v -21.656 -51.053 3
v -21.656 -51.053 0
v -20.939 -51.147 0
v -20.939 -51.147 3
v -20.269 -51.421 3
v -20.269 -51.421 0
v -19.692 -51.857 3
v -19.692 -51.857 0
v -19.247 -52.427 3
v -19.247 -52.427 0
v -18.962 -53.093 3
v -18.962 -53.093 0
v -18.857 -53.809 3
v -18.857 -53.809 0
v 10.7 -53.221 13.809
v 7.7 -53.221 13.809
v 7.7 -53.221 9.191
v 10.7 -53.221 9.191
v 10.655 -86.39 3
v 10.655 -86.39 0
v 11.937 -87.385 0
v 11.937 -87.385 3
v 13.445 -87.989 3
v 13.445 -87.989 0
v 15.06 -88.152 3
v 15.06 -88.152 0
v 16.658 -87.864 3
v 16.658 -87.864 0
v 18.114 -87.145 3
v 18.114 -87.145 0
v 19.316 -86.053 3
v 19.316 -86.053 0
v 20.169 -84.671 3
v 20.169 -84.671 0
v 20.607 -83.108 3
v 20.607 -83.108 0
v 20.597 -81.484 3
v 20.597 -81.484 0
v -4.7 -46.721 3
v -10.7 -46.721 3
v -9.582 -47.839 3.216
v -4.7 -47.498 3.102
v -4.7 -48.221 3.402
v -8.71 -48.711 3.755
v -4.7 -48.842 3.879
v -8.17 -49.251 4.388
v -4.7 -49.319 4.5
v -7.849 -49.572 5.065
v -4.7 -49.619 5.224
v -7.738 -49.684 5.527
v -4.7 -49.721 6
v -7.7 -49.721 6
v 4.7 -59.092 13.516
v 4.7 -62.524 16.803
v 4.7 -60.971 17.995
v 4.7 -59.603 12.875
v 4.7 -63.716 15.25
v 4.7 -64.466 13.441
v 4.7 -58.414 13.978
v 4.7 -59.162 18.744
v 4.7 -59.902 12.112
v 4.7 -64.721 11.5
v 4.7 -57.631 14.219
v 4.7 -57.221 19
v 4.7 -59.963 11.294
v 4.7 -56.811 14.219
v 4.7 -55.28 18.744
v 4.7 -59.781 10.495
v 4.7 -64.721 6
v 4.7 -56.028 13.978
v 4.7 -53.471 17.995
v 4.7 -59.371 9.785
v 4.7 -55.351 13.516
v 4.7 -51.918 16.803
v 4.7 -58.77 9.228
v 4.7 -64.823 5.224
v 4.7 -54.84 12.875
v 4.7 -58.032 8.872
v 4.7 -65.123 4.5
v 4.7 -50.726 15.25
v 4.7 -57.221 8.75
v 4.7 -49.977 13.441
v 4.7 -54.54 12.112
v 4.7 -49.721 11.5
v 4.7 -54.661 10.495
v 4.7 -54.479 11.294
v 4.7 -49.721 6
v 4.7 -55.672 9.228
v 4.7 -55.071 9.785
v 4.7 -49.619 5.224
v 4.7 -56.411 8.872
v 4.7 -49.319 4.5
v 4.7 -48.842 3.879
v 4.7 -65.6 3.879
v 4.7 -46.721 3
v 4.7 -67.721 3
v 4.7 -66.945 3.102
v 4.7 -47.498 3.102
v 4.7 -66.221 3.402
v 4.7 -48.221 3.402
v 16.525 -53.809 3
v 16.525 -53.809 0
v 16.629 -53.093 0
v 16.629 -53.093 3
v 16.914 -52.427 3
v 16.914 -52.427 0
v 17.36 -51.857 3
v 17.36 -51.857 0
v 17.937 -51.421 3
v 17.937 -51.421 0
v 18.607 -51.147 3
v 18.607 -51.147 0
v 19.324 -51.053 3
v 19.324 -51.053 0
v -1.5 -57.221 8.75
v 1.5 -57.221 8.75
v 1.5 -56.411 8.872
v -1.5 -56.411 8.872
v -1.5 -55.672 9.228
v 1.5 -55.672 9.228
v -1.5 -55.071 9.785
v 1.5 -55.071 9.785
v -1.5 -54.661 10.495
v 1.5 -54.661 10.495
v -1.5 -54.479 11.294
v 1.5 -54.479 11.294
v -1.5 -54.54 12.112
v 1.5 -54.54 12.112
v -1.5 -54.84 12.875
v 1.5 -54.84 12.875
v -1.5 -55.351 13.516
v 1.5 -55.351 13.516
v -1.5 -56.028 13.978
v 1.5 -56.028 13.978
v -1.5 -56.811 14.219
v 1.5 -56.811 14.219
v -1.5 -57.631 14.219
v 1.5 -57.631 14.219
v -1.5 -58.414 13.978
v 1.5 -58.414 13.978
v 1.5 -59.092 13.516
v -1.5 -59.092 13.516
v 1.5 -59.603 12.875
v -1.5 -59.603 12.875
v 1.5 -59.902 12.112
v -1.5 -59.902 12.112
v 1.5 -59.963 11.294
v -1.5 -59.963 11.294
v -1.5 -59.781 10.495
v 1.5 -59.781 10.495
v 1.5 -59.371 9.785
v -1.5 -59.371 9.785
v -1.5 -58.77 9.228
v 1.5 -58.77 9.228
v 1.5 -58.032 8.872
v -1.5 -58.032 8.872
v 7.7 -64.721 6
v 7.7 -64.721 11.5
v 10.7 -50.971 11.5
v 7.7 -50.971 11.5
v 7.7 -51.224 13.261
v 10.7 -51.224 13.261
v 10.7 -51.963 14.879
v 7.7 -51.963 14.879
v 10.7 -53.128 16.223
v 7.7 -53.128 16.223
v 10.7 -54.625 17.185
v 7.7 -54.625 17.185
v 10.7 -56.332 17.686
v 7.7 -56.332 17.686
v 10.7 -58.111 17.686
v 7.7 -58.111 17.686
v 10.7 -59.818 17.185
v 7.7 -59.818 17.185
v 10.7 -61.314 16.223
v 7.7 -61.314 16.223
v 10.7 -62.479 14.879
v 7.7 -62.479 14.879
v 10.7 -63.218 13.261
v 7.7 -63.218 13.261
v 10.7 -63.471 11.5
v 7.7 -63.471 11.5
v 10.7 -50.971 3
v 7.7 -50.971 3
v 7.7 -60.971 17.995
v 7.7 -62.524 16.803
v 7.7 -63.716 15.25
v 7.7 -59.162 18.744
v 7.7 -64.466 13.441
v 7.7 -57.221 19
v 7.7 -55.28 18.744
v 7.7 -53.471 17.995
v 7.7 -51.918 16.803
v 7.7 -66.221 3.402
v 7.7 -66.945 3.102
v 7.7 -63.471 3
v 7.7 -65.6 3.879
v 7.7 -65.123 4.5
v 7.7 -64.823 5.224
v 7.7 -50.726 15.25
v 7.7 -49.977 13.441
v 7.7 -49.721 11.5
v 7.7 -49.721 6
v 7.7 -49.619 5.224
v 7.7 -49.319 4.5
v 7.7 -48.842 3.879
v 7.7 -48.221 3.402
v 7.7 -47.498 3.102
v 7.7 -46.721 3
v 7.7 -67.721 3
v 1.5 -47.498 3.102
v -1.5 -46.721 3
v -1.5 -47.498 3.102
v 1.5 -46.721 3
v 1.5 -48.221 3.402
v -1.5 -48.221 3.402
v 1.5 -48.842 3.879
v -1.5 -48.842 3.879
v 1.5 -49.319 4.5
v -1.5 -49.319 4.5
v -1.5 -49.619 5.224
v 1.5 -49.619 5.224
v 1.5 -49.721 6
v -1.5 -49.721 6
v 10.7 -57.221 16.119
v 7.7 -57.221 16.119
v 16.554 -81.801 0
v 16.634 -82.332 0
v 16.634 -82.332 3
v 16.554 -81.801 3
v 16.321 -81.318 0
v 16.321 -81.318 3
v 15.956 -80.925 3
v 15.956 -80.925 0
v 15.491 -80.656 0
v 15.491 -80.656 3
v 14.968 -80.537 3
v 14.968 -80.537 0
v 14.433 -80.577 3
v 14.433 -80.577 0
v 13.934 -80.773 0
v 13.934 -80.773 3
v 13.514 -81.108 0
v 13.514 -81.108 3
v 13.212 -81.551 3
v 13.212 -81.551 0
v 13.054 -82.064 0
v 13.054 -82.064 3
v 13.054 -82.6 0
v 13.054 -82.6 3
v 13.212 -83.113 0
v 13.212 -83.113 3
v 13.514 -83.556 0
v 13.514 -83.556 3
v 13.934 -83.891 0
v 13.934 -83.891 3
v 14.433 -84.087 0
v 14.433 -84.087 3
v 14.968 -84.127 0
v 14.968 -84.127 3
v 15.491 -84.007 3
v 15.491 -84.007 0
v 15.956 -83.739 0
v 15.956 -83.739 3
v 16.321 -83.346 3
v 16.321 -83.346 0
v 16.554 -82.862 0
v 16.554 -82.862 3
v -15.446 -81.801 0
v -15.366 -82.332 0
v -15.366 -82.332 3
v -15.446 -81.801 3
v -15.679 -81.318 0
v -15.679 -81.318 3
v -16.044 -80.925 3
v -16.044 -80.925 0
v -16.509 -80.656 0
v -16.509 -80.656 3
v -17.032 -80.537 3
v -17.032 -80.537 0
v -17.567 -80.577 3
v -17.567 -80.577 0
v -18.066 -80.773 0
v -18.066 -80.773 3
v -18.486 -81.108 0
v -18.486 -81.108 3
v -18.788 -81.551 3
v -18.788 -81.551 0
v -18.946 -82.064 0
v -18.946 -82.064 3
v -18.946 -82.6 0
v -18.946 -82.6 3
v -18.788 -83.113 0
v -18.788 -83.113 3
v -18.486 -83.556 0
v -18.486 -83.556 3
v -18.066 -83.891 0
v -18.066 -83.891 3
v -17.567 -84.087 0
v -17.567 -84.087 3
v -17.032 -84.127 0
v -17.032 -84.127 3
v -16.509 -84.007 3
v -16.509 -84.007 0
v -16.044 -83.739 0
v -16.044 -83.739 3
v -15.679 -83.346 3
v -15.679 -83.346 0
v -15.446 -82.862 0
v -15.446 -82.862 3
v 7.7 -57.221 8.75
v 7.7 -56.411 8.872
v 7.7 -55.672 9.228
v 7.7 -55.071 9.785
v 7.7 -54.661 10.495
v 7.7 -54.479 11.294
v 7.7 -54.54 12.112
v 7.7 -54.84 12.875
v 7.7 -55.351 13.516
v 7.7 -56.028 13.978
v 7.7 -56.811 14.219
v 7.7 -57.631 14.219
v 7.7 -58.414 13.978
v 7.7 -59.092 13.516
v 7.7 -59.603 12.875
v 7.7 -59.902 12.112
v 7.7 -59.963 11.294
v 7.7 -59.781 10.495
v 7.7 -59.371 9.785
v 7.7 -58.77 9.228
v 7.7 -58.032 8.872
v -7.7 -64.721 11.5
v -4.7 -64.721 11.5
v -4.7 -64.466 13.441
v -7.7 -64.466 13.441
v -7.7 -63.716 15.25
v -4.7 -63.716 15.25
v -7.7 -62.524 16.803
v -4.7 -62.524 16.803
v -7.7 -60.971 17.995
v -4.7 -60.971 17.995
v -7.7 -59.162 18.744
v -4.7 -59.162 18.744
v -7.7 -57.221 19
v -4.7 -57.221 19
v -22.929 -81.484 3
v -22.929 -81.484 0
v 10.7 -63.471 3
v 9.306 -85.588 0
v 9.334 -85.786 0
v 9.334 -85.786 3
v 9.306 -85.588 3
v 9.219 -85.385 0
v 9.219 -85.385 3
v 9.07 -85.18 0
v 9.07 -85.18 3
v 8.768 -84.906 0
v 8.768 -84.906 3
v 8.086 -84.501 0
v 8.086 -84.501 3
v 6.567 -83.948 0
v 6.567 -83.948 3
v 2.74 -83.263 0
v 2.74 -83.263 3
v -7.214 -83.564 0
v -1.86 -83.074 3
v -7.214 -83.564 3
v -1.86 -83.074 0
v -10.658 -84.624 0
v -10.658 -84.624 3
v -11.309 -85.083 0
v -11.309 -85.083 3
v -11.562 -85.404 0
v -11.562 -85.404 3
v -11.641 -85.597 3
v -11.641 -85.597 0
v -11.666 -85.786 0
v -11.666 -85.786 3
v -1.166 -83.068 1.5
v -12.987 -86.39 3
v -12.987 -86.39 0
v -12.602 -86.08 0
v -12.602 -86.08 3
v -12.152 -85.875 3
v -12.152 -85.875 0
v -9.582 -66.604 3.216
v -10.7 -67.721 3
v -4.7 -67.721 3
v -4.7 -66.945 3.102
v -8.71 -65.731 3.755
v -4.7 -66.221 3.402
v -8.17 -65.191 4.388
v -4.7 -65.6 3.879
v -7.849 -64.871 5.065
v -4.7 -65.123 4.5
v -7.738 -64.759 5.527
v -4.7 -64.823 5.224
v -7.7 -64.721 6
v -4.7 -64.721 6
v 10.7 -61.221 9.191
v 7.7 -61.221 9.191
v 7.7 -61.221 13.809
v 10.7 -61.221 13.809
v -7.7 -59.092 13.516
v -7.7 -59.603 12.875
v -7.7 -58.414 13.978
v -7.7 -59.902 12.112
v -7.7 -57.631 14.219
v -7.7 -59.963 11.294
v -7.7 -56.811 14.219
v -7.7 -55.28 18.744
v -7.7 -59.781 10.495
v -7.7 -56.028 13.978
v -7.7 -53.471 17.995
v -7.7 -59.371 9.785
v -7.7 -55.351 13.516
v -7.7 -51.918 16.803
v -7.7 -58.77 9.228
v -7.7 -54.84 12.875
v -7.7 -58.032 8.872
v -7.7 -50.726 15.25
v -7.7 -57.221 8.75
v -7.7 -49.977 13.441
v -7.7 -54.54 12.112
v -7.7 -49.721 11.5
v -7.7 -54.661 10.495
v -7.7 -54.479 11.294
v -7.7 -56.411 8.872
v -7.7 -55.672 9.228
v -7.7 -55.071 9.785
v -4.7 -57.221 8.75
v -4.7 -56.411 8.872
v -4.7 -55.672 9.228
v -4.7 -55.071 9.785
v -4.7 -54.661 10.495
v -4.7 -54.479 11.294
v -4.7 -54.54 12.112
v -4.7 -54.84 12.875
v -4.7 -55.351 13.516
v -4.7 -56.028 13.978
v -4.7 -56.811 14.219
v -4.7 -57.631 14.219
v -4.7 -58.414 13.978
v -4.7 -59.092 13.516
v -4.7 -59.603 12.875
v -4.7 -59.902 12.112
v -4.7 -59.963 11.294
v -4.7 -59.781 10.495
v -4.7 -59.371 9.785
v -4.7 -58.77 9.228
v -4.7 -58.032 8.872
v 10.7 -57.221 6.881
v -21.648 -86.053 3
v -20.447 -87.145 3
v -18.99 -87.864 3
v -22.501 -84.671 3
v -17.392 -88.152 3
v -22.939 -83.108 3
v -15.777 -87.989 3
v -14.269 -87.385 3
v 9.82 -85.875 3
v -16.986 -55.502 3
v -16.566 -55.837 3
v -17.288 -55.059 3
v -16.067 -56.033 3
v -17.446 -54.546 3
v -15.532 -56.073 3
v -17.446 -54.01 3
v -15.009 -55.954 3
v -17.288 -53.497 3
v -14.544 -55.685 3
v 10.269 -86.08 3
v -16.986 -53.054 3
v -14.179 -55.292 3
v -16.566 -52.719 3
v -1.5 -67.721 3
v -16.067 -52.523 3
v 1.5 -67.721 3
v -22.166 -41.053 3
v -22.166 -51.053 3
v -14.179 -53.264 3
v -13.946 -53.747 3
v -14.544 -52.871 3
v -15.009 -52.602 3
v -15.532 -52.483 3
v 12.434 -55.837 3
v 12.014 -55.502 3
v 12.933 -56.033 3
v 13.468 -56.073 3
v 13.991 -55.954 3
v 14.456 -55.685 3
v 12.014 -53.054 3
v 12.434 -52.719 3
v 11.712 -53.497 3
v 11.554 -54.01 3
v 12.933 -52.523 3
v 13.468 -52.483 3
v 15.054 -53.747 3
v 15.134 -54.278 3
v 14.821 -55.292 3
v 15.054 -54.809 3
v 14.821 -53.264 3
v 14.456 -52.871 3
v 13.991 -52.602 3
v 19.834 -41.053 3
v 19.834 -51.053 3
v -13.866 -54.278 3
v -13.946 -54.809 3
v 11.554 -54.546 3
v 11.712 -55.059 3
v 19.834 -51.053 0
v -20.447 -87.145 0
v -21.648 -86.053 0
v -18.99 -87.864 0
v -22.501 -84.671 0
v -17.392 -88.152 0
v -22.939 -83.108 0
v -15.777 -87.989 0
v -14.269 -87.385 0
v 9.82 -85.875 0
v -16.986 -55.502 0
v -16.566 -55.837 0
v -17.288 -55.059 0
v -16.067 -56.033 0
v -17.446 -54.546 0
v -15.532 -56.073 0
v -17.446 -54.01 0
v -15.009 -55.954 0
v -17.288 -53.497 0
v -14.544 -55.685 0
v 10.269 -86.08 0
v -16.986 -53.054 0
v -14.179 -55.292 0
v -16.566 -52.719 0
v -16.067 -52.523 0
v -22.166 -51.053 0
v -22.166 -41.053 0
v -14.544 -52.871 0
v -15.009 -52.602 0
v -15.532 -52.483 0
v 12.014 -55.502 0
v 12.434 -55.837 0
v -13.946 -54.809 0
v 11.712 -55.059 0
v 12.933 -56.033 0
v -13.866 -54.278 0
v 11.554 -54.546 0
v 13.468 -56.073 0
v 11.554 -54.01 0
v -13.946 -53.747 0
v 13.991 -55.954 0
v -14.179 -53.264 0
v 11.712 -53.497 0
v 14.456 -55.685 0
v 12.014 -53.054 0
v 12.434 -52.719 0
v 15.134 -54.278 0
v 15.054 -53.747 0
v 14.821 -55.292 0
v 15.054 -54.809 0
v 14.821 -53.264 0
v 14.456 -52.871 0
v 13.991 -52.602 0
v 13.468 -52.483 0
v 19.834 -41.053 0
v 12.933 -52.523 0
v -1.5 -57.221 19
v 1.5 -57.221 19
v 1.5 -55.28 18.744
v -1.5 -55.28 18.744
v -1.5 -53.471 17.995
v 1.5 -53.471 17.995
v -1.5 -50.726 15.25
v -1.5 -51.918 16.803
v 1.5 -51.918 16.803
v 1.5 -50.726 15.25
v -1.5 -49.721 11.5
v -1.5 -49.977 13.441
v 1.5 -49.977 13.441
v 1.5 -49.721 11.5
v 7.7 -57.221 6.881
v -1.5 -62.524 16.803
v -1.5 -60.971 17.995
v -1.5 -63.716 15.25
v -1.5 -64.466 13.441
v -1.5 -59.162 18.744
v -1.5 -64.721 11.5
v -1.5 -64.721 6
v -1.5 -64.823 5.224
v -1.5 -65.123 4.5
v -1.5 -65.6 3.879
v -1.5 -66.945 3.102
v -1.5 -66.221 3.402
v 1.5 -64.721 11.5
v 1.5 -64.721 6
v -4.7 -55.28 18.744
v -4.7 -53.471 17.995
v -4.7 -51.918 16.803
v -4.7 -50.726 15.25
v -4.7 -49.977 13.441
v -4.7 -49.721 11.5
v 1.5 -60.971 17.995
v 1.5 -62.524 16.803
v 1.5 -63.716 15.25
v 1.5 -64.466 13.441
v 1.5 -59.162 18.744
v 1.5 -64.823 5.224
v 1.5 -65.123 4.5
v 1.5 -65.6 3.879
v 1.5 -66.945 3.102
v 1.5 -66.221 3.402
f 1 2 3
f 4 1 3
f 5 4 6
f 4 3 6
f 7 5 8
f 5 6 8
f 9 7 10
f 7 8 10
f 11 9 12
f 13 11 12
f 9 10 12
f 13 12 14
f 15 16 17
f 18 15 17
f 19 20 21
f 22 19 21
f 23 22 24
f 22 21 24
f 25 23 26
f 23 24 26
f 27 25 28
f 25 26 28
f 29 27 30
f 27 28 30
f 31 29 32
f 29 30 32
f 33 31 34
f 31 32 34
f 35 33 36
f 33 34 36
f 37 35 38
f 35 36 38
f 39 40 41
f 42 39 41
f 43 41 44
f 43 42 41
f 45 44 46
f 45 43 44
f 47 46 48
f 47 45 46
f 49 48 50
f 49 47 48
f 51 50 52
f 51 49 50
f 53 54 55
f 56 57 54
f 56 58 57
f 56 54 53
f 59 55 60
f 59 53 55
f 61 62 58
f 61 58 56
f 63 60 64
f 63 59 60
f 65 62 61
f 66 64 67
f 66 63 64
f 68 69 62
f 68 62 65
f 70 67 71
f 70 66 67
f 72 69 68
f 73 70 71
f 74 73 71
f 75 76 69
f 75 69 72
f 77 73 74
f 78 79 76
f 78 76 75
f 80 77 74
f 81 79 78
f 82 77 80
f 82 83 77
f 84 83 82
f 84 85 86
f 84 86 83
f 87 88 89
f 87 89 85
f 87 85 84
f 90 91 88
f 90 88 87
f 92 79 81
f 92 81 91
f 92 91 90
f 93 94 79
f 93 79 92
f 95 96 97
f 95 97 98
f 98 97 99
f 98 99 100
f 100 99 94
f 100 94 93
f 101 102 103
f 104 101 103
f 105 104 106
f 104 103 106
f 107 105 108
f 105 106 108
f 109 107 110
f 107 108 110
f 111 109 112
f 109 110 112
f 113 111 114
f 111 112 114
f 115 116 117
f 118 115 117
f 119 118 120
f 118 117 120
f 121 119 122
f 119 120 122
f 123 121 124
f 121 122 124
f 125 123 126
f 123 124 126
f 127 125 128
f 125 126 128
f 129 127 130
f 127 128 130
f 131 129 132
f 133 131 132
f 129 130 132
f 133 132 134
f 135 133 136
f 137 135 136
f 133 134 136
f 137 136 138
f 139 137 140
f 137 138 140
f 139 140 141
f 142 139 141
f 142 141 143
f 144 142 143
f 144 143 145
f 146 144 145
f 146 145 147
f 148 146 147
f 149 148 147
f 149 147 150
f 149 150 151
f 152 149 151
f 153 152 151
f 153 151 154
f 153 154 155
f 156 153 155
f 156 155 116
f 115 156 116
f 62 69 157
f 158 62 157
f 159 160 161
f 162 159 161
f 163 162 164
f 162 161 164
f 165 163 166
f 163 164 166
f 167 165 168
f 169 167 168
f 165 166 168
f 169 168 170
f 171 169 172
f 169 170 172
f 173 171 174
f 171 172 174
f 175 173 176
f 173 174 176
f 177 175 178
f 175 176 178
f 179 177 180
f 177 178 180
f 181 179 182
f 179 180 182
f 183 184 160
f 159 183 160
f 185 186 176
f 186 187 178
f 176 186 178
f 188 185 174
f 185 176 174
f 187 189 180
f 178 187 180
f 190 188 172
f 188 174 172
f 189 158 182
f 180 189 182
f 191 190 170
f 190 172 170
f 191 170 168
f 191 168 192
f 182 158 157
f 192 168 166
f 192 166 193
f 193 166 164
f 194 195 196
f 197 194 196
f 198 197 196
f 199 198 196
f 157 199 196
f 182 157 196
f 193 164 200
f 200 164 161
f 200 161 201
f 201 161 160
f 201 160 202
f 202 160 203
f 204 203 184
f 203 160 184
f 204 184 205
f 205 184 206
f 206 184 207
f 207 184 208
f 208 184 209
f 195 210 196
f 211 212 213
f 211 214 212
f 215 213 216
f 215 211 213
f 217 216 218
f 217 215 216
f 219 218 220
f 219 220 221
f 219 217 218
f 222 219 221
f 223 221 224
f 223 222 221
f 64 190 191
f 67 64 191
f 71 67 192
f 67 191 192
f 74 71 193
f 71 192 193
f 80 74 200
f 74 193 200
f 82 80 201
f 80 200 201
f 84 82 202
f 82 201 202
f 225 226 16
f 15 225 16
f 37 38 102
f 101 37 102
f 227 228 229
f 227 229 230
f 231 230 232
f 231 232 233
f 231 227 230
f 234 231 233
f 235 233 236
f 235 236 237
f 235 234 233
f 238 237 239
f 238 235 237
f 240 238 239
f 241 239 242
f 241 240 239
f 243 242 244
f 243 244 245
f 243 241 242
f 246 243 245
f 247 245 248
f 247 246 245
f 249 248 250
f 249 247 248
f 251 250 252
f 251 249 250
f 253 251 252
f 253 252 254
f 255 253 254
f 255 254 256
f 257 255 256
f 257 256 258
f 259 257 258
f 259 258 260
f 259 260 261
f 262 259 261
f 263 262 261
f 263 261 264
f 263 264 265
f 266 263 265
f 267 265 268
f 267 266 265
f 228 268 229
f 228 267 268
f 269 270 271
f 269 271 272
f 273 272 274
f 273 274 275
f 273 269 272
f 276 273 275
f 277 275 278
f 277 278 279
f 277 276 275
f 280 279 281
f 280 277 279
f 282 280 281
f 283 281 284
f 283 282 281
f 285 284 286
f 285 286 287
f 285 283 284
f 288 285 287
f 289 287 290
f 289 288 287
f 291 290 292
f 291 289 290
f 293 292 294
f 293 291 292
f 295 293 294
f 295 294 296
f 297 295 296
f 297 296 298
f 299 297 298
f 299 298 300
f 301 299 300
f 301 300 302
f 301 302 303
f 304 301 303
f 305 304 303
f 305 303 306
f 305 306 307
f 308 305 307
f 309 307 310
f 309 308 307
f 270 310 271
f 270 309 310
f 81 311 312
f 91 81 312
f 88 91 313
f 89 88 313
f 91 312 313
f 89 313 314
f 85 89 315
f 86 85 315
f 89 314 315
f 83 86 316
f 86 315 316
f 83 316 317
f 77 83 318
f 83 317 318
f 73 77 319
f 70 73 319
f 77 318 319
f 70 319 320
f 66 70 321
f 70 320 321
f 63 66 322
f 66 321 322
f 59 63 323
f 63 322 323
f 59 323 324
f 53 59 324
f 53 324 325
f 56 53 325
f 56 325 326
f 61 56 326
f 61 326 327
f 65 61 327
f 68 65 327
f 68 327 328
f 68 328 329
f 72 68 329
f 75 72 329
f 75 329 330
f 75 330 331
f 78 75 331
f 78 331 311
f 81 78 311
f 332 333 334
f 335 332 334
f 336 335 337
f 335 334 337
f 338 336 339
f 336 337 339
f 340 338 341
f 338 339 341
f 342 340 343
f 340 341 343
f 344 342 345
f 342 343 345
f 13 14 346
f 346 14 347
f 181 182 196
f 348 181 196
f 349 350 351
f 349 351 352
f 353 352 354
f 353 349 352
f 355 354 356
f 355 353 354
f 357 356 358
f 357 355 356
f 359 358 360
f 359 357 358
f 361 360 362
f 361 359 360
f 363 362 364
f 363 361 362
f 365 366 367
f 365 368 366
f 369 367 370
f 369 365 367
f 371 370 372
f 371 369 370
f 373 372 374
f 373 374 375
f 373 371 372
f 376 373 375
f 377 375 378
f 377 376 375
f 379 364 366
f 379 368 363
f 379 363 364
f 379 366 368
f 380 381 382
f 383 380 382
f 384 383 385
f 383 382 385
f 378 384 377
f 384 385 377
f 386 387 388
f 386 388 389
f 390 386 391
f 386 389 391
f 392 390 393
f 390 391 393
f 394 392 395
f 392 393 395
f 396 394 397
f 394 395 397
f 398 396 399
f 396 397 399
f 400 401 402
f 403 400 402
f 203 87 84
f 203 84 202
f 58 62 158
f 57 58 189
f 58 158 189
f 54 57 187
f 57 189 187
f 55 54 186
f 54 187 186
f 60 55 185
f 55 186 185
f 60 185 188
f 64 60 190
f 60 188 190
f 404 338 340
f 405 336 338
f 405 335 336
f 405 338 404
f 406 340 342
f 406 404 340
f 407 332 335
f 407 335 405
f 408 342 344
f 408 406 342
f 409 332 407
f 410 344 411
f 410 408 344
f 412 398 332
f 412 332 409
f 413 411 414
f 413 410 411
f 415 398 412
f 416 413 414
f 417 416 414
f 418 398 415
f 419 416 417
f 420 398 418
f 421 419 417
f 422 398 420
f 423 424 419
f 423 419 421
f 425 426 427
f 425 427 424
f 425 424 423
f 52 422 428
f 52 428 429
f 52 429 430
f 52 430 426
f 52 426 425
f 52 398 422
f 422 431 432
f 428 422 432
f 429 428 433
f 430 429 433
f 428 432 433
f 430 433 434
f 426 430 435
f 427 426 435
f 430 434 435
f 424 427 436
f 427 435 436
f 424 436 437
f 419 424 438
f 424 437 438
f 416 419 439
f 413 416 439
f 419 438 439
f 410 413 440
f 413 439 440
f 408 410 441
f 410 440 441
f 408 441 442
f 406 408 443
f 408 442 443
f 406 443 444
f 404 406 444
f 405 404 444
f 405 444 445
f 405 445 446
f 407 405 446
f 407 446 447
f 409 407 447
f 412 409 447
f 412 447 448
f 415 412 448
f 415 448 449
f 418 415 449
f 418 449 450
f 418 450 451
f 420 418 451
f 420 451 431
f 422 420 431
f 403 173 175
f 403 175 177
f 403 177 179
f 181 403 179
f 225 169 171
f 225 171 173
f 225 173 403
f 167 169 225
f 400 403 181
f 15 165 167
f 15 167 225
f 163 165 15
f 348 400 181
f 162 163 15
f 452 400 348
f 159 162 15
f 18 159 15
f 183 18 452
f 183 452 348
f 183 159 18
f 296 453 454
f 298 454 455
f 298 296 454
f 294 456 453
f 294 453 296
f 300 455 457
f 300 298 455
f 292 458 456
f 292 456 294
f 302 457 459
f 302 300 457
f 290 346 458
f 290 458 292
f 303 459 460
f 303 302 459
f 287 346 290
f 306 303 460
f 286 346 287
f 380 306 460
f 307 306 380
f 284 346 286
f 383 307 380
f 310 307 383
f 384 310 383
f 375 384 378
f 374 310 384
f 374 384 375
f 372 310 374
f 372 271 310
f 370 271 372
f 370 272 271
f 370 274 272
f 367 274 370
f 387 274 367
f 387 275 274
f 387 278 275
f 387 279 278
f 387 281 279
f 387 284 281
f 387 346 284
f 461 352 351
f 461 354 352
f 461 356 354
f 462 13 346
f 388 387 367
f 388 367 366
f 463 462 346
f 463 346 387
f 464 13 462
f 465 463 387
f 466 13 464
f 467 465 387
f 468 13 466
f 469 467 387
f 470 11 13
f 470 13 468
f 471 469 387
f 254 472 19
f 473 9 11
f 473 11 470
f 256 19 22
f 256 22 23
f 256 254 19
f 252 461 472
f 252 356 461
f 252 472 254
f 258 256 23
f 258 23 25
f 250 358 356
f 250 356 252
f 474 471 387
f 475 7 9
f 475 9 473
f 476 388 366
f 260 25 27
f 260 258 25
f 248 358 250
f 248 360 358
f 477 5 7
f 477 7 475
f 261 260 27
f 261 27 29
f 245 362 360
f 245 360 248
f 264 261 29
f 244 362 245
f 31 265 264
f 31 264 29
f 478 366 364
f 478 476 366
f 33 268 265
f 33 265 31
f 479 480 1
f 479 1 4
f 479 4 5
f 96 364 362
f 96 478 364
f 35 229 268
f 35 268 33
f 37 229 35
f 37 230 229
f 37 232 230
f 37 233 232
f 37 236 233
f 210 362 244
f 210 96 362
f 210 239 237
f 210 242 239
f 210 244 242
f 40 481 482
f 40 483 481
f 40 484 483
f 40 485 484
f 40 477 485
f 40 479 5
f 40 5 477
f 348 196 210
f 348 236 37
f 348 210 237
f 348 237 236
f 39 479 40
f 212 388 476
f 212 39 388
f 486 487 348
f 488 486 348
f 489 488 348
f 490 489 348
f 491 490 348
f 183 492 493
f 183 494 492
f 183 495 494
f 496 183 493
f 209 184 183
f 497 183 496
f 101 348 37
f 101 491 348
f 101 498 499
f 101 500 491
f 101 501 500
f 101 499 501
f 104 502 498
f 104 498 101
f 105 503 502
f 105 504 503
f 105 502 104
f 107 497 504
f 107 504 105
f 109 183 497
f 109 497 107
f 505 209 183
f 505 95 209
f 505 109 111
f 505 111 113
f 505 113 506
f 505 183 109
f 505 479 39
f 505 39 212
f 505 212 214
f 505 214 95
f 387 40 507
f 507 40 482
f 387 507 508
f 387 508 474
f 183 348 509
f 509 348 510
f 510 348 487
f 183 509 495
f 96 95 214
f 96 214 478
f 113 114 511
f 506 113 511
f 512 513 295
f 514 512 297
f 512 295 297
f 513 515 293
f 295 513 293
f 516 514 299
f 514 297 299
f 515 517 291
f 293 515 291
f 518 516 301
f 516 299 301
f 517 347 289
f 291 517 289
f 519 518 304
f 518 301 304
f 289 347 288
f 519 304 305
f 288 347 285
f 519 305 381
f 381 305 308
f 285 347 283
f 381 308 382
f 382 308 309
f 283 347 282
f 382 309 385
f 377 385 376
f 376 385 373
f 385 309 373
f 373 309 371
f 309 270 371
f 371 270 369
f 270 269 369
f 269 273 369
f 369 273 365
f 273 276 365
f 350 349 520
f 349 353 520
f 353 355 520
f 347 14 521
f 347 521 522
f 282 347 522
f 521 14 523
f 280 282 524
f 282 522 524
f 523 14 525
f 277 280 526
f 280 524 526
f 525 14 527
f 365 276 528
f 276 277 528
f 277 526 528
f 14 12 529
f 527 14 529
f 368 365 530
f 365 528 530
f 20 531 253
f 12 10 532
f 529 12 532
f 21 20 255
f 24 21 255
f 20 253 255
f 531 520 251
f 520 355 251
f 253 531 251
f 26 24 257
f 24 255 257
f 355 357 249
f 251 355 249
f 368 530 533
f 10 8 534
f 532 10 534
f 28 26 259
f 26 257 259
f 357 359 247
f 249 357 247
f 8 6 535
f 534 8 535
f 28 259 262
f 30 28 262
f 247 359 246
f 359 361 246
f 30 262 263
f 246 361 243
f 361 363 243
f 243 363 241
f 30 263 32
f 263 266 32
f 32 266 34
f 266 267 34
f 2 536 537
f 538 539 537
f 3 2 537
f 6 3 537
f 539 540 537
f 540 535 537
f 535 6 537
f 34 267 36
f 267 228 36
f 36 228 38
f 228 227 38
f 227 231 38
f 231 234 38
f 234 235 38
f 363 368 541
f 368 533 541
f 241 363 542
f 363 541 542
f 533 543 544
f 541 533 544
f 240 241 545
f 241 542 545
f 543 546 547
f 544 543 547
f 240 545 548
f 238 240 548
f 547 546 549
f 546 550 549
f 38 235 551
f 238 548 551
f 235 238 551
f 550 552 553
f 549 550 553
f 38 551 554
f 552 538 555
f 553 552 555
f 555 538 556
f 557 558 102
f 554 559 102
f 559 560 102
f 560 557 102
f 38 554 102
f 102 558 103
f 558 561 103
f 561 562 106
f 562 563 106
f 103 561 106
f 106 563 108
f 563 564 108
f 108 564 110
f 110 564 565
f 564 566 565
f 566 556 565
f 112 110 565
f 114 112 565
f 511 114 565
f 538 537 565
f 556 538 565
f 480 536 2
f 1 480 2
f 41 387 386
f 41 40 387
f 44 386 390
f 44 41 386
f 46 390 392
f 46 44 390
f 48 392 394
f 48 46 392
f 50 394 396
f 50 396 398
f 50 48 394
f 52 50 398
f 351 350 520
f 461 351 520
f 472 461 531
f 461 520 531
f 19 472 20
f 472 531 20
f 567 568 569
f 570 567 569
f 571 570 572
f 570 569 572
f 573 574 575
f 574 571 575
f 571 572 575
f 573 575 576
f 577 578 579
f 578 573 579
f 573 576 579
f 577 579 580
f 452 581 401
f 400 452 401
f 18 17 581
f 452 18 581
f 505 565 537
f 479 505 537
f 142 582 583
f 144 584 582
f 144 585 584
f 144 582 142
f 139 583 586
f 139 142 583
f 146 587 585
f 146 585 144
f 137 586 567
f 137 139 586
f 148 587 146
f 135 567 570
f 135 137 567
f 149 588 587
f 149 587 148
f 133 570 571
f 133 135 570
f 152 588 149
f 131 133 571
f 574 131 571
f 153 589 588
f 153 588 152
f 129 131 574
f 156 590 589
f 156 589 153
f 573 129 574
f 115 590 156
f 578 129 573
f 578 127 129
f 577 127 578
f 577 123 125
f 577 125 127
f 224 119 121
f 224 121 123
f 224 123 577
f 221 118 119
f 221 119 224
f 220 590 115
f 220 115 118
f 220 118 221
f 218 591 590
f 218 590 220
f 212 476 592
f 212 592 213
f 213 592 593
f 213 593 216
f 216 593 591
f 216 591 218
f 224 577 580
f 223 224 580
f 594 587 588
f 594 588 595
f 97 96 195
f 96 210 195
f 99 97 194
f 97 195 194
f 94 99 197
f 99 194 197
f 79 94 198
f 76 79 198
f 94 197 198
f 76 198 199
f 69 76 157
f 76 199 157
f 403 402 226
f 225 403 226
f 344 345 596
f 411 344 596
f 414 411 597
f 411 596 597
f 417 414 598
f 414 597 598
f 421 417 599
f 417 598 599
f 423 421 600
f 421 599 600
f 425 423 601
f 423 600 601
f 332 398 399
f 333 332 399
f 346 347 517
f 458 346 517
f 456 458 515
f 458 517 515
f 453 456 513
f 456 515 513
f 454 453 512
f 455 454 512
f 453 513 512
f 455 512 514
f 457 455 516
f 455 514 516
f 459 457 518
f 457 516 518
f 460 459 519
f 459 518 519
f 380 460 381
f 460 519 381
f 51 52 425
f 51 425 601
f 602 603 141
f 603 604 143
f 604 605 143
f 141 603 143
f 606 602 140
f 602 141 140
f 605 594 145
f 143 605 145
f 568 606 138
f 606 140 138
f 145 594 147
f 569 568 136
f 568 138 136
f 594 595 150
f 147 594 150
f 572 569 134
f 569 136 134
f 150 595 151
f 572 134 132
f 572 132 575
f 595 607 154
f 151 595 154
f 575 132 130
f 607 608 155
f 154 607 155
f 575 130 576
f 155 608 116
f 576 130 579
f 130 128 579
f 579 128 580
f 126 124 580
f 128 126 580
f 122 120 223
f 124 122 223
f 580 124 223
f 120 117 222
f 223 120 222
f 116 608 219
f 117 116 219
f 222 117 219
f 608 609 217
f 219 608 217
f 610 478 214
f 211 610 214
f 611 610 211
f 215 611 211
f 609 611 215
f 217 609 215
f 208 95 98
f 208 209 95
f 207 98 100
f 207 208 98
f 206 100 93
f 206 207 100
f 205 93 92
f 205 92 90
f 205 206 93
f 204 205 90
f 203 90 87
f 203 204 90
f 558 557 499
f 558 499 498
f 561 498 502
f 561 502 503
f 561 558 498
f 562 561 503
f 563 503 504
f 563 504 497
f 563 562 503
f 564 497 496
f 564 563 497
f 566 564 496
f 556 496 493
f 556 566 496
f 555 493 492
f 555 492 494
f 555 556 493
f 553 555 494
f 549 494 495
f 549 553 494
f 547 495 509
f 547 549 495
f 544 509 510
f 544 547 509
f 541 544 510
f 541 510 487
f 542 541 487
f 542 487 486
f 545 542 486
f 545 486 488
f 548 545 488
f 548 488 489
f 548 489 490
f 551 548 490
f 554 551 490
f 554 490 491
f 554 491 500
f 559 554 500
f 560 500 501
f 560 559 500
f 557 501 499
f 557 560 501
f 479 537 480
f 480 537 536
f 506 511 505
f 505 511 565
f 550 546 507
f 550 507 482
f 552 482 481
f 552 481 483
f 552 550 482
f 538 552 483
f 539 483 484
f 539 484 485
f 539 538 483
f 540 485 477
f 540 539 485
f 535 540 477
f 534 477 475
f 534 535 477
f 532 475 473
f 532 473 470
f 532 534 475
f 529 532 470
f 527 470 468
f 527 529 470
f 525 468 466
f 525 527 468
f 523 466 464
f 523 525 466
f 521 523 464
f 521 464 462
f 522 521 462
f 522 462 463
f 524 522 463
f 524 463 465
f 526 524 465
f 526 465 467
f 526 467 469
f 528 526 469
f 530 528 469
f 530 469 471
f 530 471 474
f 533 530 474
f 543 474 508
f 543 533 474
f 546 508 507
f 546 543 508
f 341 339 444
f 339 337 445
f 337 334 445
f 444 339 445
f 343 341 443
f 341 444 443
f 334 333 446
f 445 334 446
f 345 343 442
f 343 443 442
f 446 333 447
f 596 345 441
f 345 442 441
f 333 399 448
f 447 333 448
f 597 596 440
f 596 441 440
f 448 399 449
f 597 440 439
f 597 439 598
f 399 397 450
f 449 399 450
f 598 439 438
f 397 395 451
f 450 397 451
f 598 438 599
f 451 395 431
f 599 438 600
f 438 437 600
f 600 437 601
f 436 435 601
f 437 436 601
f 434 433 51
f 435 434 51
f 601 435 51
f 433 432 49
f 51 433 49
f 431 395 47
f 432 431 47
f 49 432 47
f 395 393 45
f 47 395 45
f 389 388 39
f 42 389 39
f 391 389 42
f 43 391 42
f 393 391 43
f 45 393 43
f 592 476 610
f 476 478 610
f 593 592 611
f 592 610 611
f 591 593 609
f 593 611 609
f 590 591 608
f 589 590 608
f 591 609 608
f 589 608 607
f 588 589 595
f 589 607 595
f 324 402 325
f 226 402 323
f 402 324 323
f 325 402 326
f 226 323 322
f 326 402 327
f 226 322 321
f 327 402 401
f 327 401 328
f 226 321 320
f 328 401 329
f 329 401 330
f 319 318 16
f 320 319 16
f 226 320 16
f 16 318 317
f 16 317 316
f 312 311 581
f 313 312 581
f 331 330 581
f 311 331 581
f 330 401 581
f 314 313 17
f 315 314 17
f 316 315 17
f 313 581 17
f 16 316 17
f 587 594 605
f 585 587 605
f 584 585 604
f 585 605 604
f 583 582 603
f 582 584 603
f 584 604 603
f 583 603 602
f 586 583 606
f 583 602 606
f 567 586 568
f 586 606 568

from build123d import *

# Parameters (mm, degrees)
SKETCH1_R           = 1.8
BOSS_EXTRUDE1_DEPTH = 3
SKETCH2_W           = 3
SKETCH2_H           = 15
BOSS_EXTRUDE2_DEPTH = 16
CUT_EXTRUDE1_REACH  = 97.261
SKETCH3_R           = 2.75
BOSS_EXTRUDE3_DEPTH = 3
FILLET1_R           = 3


with BuildPart() as part:
    # Sketch1 → Boss-Extrude1 (new body)
    with BuildSketch(Plane.XY):
        with BuildLine():
            Line((-22.166135034, -51.05300244), (-21.656424966, -51.05300244))
            ThreePointArc((-21.656424966, -51.05300244), (-19.69231813, -51.85743627), (-18.856778426, -53.808513627))
            Line((-18.856778426, -53.808513627), (-22.929080076, -81.483853258))
            ThreePointArc((-22.929080076, -81.483853258), (-19.743611023, -87.555563903), (-12.986896887, -86.389503303))
            ThreePointArc((-12.986896887, -86.389503303), (-12.38322773, -85.963624342), (-11.666135034, -85.785952153))
            add(Edge.make_bspline(
                [(9.333864966, -85.785952153), (9.333864966, -83.068352179), (-1.166135034, -83.068352179), (-11.666135034, -83.068352179), (-11.666135034, -85.785952153)],
                knots=[3.141592654, 3.141592654, 3.141592654, 4.71238898, 4.71238898, 6.283185307, 6.283185307, 6.283185307], degree=2, weights=[1, 0.707106781, 1, 0.707106781, 1]))
            ThreePointArc((9.333864966, -85.785952153), (10.050957661, -85.963624342), (10.654626818, -86.389503303))
            ThreePointArc((10.654626818, -86.389503303), (17.411340954, -87.555563903), (20.596810007, -81.483853258))
            Line((20.596810007, -81.483853258), (16.524508358, -53.808513627))
            ThreePointArc((16.524508358, -53.808513627), (17.360048061, -51.85743627), (19.324154897, -51.05300244))
            Line((19.324154897, -51.05300244), (19.833864966, -51.05300244))
            Line((19.833864966, -51.05300244), (19.833864966, -41.05300244))
            Line((19.833864966, -41.05300244), (-22.166135034, -41.05300244))
            Line((-22.166135034, -41.05300244), (-22.166135034, -51.05300244))
        make_face()
        with Locations((-15.666135034, -54.27800244)):
            Circle(SKETCH1_R, mode=Mode.SUBTRACT)
        with Locations((-17.166135034, -82.33184468)):
            Circle(SKETCH1_R, mode=Mode.SUBTRACT)
        with Locations((14.833864966, -82.33184468)):
            Circle(SKETCH1_R, mode=Mode.SUBTRACT)
        with Locations((13.333864966, -54.27800244)):
            Circle(SKETCH1_R, mode=Mode.SUBTRACT)
    extrude(amount=BOSS_EXTRUDE1_DEPTH)

    # Sketch2 → Boss-Extrude2 (add)
    with BuildSketch(Plane.XY.offset(3)):
        with Locations((0, -57.22115776)):
            Rectangle(SKETCH2_W, SKETCH2_H)
        with Locations((-6.2, -57.22115776)):
            Rectangle(SKETCH2_W, SKETCH2_H)
        with Locations((6.2, -57.22115776)):
            Rectangle(SKETCH2_W, SKETCH2_H)
    extrude(amount=BOSS_EXTRUDE2_DEPTH)

    # Sketch3 → Cut-Extrude1 (cut, up to next)
    with BuildSketch(Plane(origin=(7.7, 0, 0), x_dir=(0, 0, -1), z_dir=(1, 0, 0)), mode=Mode.PRIVATE) as cut_extrude1_sk1:
        with Locations((-11.5, -57.22115776)):
            Circle(SKETCH3_R)
    cut_extrude1_tool1 = extrude(cut_extrude1_sk1.sketch, amount=-CUT_EXTRUDE1_REACH, mode=Mode.PRIVATE) & part.part
    # Sketch3 → Cut-Extrude1 (cut, up to next)
    with BuildSketch(Plane(origin=(7.7, 0, 0), x_dir=(0, 0, -1), z_dir=(1, 0, 0)), mode=Mode.PRIVATE) as cut_extrude1_sk2:
        with BuildLine():
            ThreePointArc((-19, -57.22115776), (-16.803300859, -51.917856901), (-11.5, -49.72115776))
            Line((-11.5, -49.72115776), (-19, -49.72115776))
            Line((-19, -49.72115776), (-19, -57.22115776))
        make_face()
    cut_extrude1_tool2 = extrude(cut_extrude1_sk2.sketch, amount=-CUT_EXTRUDE1_REACH, mode=Mode.PRIVATE) & part.part
    # Sketch3 → Cut-Extrude1 (cut, up to next)
    with BuildSketch(Plane(origin=(7.7, 0, 0), x_dir=(0, 0, -1), z_dir=(1, 0, 0)), mode=Mode.PRIVATE) as cut_extrude1_sk3:
        with BuildLine():
            Line((-19, -64.72115776), (-11.5, -64.72115776))
            ThreePointArc((-11.5, -64.72115776), (-16.803300859, -62.524458619), (-19, -57.22115776))
            Line((-19, -57.22115776), (-19, -64.72115776))
        make_face()
    cut_extrude1_tool3 = extrude(cut_extrude1_sk3.sketch, amount=-CUT_EXTRUDE1_REACH, mode=Mode.PRIVATE) & part.part
    add(cut_extrude1_tool1.solids().sort_by_distance((7.7, -57.221158, 11.5))[0], mode=Mode.SUBTRACT)
    add(cut_extrude1_tool1.solids().sort_by_distance((7.7, -57.221158, 11.5))[1], mode=Mode.SUBTRACT)
    add(cut_extrude1_tool1.solids().sort_by_distance((7.7, -57.221158, 11.5))[2], mode=Mode.SUBTRACT)
    add(cut_extrude1_tool2.solids().sort_by_distance((7.7, -51.396417, 17.32474))[0], mode=Mode.SUBTRACT)
    add(cut_extrude1_tool2.solids().sort_by_distance((7.7, -51.396417, 17.32474))[1], mode=Mode.SUBTRACT)
    add(cut_extrude1_tool2.solids().sort_by_distance((7.7, -51.396417, 17.32474))[2], mode=Mode.SUBTRACT)
    add(cut_extrude1_tool3.solids().sort_by_distance((7.7, -63.045898, 17.32474))[0], mode=Mode.SUBTRACT)
    add(cut_extrude1_tool3.solids().sort_by_distance((7.7, -63.045898, 17.32474))[1], mode=Mode.SUBTRACT)
    add(cut_extrude1_tool3.solids().sort_by_distance((7.7, -63.045898, 17.32474))[2], mode=Mode.SUBTRACT)

    # Sketch4 → Boss-Extrude3 (add)
    with BuildSketch(Plane(origin=(7.7, 0, 0), x_dir=(0, 0, -1), z_dir=(1, 0, 0))):
        with BuildLine():
            Line((-3, -50.97115776), (-11.5, -50.97115776))
            ThreePointArc((-11.5, -50.97115776), (-17.75, -57.22115776), (-11.5, -63.47115776))
            Line((-11.5, -63.47115776), (-3, -63.47115776))
            Line((-3, -63.47115776), (-3, -50.97115776))
        make_face()
        Polygon((-9.190598923, -61.22115776), (-13.809401077, -61.22115776), (-16.118802154, -57.22115776), (-13.809401077, -53.22115776), (-9.190598923, -53.22115776), (-6.881197846, -57.22115776), align=None, mode=Mode.SUBTRACT)
    extrude(amount=BOSS_EXTRUDE3_DEPTH)

    # Fillet1
    fillet1_edges = [part.edges().sort_by_distance(p)[0] for p in [
        (0, -49.72115776, 3),
        (0, -64.72115776, 3),
        (-6.2, -49.72115776, 3),
        (-7.7, -57.22115776, 3),
        (-6.2, -64.72115776, 3),
        (6.2, -49.72115776, 3),
        (6.2, -64.72115776, 3),
    ]]
    fillet(fillet1_edges, radius=FILLET1_R)


solid = part.part
